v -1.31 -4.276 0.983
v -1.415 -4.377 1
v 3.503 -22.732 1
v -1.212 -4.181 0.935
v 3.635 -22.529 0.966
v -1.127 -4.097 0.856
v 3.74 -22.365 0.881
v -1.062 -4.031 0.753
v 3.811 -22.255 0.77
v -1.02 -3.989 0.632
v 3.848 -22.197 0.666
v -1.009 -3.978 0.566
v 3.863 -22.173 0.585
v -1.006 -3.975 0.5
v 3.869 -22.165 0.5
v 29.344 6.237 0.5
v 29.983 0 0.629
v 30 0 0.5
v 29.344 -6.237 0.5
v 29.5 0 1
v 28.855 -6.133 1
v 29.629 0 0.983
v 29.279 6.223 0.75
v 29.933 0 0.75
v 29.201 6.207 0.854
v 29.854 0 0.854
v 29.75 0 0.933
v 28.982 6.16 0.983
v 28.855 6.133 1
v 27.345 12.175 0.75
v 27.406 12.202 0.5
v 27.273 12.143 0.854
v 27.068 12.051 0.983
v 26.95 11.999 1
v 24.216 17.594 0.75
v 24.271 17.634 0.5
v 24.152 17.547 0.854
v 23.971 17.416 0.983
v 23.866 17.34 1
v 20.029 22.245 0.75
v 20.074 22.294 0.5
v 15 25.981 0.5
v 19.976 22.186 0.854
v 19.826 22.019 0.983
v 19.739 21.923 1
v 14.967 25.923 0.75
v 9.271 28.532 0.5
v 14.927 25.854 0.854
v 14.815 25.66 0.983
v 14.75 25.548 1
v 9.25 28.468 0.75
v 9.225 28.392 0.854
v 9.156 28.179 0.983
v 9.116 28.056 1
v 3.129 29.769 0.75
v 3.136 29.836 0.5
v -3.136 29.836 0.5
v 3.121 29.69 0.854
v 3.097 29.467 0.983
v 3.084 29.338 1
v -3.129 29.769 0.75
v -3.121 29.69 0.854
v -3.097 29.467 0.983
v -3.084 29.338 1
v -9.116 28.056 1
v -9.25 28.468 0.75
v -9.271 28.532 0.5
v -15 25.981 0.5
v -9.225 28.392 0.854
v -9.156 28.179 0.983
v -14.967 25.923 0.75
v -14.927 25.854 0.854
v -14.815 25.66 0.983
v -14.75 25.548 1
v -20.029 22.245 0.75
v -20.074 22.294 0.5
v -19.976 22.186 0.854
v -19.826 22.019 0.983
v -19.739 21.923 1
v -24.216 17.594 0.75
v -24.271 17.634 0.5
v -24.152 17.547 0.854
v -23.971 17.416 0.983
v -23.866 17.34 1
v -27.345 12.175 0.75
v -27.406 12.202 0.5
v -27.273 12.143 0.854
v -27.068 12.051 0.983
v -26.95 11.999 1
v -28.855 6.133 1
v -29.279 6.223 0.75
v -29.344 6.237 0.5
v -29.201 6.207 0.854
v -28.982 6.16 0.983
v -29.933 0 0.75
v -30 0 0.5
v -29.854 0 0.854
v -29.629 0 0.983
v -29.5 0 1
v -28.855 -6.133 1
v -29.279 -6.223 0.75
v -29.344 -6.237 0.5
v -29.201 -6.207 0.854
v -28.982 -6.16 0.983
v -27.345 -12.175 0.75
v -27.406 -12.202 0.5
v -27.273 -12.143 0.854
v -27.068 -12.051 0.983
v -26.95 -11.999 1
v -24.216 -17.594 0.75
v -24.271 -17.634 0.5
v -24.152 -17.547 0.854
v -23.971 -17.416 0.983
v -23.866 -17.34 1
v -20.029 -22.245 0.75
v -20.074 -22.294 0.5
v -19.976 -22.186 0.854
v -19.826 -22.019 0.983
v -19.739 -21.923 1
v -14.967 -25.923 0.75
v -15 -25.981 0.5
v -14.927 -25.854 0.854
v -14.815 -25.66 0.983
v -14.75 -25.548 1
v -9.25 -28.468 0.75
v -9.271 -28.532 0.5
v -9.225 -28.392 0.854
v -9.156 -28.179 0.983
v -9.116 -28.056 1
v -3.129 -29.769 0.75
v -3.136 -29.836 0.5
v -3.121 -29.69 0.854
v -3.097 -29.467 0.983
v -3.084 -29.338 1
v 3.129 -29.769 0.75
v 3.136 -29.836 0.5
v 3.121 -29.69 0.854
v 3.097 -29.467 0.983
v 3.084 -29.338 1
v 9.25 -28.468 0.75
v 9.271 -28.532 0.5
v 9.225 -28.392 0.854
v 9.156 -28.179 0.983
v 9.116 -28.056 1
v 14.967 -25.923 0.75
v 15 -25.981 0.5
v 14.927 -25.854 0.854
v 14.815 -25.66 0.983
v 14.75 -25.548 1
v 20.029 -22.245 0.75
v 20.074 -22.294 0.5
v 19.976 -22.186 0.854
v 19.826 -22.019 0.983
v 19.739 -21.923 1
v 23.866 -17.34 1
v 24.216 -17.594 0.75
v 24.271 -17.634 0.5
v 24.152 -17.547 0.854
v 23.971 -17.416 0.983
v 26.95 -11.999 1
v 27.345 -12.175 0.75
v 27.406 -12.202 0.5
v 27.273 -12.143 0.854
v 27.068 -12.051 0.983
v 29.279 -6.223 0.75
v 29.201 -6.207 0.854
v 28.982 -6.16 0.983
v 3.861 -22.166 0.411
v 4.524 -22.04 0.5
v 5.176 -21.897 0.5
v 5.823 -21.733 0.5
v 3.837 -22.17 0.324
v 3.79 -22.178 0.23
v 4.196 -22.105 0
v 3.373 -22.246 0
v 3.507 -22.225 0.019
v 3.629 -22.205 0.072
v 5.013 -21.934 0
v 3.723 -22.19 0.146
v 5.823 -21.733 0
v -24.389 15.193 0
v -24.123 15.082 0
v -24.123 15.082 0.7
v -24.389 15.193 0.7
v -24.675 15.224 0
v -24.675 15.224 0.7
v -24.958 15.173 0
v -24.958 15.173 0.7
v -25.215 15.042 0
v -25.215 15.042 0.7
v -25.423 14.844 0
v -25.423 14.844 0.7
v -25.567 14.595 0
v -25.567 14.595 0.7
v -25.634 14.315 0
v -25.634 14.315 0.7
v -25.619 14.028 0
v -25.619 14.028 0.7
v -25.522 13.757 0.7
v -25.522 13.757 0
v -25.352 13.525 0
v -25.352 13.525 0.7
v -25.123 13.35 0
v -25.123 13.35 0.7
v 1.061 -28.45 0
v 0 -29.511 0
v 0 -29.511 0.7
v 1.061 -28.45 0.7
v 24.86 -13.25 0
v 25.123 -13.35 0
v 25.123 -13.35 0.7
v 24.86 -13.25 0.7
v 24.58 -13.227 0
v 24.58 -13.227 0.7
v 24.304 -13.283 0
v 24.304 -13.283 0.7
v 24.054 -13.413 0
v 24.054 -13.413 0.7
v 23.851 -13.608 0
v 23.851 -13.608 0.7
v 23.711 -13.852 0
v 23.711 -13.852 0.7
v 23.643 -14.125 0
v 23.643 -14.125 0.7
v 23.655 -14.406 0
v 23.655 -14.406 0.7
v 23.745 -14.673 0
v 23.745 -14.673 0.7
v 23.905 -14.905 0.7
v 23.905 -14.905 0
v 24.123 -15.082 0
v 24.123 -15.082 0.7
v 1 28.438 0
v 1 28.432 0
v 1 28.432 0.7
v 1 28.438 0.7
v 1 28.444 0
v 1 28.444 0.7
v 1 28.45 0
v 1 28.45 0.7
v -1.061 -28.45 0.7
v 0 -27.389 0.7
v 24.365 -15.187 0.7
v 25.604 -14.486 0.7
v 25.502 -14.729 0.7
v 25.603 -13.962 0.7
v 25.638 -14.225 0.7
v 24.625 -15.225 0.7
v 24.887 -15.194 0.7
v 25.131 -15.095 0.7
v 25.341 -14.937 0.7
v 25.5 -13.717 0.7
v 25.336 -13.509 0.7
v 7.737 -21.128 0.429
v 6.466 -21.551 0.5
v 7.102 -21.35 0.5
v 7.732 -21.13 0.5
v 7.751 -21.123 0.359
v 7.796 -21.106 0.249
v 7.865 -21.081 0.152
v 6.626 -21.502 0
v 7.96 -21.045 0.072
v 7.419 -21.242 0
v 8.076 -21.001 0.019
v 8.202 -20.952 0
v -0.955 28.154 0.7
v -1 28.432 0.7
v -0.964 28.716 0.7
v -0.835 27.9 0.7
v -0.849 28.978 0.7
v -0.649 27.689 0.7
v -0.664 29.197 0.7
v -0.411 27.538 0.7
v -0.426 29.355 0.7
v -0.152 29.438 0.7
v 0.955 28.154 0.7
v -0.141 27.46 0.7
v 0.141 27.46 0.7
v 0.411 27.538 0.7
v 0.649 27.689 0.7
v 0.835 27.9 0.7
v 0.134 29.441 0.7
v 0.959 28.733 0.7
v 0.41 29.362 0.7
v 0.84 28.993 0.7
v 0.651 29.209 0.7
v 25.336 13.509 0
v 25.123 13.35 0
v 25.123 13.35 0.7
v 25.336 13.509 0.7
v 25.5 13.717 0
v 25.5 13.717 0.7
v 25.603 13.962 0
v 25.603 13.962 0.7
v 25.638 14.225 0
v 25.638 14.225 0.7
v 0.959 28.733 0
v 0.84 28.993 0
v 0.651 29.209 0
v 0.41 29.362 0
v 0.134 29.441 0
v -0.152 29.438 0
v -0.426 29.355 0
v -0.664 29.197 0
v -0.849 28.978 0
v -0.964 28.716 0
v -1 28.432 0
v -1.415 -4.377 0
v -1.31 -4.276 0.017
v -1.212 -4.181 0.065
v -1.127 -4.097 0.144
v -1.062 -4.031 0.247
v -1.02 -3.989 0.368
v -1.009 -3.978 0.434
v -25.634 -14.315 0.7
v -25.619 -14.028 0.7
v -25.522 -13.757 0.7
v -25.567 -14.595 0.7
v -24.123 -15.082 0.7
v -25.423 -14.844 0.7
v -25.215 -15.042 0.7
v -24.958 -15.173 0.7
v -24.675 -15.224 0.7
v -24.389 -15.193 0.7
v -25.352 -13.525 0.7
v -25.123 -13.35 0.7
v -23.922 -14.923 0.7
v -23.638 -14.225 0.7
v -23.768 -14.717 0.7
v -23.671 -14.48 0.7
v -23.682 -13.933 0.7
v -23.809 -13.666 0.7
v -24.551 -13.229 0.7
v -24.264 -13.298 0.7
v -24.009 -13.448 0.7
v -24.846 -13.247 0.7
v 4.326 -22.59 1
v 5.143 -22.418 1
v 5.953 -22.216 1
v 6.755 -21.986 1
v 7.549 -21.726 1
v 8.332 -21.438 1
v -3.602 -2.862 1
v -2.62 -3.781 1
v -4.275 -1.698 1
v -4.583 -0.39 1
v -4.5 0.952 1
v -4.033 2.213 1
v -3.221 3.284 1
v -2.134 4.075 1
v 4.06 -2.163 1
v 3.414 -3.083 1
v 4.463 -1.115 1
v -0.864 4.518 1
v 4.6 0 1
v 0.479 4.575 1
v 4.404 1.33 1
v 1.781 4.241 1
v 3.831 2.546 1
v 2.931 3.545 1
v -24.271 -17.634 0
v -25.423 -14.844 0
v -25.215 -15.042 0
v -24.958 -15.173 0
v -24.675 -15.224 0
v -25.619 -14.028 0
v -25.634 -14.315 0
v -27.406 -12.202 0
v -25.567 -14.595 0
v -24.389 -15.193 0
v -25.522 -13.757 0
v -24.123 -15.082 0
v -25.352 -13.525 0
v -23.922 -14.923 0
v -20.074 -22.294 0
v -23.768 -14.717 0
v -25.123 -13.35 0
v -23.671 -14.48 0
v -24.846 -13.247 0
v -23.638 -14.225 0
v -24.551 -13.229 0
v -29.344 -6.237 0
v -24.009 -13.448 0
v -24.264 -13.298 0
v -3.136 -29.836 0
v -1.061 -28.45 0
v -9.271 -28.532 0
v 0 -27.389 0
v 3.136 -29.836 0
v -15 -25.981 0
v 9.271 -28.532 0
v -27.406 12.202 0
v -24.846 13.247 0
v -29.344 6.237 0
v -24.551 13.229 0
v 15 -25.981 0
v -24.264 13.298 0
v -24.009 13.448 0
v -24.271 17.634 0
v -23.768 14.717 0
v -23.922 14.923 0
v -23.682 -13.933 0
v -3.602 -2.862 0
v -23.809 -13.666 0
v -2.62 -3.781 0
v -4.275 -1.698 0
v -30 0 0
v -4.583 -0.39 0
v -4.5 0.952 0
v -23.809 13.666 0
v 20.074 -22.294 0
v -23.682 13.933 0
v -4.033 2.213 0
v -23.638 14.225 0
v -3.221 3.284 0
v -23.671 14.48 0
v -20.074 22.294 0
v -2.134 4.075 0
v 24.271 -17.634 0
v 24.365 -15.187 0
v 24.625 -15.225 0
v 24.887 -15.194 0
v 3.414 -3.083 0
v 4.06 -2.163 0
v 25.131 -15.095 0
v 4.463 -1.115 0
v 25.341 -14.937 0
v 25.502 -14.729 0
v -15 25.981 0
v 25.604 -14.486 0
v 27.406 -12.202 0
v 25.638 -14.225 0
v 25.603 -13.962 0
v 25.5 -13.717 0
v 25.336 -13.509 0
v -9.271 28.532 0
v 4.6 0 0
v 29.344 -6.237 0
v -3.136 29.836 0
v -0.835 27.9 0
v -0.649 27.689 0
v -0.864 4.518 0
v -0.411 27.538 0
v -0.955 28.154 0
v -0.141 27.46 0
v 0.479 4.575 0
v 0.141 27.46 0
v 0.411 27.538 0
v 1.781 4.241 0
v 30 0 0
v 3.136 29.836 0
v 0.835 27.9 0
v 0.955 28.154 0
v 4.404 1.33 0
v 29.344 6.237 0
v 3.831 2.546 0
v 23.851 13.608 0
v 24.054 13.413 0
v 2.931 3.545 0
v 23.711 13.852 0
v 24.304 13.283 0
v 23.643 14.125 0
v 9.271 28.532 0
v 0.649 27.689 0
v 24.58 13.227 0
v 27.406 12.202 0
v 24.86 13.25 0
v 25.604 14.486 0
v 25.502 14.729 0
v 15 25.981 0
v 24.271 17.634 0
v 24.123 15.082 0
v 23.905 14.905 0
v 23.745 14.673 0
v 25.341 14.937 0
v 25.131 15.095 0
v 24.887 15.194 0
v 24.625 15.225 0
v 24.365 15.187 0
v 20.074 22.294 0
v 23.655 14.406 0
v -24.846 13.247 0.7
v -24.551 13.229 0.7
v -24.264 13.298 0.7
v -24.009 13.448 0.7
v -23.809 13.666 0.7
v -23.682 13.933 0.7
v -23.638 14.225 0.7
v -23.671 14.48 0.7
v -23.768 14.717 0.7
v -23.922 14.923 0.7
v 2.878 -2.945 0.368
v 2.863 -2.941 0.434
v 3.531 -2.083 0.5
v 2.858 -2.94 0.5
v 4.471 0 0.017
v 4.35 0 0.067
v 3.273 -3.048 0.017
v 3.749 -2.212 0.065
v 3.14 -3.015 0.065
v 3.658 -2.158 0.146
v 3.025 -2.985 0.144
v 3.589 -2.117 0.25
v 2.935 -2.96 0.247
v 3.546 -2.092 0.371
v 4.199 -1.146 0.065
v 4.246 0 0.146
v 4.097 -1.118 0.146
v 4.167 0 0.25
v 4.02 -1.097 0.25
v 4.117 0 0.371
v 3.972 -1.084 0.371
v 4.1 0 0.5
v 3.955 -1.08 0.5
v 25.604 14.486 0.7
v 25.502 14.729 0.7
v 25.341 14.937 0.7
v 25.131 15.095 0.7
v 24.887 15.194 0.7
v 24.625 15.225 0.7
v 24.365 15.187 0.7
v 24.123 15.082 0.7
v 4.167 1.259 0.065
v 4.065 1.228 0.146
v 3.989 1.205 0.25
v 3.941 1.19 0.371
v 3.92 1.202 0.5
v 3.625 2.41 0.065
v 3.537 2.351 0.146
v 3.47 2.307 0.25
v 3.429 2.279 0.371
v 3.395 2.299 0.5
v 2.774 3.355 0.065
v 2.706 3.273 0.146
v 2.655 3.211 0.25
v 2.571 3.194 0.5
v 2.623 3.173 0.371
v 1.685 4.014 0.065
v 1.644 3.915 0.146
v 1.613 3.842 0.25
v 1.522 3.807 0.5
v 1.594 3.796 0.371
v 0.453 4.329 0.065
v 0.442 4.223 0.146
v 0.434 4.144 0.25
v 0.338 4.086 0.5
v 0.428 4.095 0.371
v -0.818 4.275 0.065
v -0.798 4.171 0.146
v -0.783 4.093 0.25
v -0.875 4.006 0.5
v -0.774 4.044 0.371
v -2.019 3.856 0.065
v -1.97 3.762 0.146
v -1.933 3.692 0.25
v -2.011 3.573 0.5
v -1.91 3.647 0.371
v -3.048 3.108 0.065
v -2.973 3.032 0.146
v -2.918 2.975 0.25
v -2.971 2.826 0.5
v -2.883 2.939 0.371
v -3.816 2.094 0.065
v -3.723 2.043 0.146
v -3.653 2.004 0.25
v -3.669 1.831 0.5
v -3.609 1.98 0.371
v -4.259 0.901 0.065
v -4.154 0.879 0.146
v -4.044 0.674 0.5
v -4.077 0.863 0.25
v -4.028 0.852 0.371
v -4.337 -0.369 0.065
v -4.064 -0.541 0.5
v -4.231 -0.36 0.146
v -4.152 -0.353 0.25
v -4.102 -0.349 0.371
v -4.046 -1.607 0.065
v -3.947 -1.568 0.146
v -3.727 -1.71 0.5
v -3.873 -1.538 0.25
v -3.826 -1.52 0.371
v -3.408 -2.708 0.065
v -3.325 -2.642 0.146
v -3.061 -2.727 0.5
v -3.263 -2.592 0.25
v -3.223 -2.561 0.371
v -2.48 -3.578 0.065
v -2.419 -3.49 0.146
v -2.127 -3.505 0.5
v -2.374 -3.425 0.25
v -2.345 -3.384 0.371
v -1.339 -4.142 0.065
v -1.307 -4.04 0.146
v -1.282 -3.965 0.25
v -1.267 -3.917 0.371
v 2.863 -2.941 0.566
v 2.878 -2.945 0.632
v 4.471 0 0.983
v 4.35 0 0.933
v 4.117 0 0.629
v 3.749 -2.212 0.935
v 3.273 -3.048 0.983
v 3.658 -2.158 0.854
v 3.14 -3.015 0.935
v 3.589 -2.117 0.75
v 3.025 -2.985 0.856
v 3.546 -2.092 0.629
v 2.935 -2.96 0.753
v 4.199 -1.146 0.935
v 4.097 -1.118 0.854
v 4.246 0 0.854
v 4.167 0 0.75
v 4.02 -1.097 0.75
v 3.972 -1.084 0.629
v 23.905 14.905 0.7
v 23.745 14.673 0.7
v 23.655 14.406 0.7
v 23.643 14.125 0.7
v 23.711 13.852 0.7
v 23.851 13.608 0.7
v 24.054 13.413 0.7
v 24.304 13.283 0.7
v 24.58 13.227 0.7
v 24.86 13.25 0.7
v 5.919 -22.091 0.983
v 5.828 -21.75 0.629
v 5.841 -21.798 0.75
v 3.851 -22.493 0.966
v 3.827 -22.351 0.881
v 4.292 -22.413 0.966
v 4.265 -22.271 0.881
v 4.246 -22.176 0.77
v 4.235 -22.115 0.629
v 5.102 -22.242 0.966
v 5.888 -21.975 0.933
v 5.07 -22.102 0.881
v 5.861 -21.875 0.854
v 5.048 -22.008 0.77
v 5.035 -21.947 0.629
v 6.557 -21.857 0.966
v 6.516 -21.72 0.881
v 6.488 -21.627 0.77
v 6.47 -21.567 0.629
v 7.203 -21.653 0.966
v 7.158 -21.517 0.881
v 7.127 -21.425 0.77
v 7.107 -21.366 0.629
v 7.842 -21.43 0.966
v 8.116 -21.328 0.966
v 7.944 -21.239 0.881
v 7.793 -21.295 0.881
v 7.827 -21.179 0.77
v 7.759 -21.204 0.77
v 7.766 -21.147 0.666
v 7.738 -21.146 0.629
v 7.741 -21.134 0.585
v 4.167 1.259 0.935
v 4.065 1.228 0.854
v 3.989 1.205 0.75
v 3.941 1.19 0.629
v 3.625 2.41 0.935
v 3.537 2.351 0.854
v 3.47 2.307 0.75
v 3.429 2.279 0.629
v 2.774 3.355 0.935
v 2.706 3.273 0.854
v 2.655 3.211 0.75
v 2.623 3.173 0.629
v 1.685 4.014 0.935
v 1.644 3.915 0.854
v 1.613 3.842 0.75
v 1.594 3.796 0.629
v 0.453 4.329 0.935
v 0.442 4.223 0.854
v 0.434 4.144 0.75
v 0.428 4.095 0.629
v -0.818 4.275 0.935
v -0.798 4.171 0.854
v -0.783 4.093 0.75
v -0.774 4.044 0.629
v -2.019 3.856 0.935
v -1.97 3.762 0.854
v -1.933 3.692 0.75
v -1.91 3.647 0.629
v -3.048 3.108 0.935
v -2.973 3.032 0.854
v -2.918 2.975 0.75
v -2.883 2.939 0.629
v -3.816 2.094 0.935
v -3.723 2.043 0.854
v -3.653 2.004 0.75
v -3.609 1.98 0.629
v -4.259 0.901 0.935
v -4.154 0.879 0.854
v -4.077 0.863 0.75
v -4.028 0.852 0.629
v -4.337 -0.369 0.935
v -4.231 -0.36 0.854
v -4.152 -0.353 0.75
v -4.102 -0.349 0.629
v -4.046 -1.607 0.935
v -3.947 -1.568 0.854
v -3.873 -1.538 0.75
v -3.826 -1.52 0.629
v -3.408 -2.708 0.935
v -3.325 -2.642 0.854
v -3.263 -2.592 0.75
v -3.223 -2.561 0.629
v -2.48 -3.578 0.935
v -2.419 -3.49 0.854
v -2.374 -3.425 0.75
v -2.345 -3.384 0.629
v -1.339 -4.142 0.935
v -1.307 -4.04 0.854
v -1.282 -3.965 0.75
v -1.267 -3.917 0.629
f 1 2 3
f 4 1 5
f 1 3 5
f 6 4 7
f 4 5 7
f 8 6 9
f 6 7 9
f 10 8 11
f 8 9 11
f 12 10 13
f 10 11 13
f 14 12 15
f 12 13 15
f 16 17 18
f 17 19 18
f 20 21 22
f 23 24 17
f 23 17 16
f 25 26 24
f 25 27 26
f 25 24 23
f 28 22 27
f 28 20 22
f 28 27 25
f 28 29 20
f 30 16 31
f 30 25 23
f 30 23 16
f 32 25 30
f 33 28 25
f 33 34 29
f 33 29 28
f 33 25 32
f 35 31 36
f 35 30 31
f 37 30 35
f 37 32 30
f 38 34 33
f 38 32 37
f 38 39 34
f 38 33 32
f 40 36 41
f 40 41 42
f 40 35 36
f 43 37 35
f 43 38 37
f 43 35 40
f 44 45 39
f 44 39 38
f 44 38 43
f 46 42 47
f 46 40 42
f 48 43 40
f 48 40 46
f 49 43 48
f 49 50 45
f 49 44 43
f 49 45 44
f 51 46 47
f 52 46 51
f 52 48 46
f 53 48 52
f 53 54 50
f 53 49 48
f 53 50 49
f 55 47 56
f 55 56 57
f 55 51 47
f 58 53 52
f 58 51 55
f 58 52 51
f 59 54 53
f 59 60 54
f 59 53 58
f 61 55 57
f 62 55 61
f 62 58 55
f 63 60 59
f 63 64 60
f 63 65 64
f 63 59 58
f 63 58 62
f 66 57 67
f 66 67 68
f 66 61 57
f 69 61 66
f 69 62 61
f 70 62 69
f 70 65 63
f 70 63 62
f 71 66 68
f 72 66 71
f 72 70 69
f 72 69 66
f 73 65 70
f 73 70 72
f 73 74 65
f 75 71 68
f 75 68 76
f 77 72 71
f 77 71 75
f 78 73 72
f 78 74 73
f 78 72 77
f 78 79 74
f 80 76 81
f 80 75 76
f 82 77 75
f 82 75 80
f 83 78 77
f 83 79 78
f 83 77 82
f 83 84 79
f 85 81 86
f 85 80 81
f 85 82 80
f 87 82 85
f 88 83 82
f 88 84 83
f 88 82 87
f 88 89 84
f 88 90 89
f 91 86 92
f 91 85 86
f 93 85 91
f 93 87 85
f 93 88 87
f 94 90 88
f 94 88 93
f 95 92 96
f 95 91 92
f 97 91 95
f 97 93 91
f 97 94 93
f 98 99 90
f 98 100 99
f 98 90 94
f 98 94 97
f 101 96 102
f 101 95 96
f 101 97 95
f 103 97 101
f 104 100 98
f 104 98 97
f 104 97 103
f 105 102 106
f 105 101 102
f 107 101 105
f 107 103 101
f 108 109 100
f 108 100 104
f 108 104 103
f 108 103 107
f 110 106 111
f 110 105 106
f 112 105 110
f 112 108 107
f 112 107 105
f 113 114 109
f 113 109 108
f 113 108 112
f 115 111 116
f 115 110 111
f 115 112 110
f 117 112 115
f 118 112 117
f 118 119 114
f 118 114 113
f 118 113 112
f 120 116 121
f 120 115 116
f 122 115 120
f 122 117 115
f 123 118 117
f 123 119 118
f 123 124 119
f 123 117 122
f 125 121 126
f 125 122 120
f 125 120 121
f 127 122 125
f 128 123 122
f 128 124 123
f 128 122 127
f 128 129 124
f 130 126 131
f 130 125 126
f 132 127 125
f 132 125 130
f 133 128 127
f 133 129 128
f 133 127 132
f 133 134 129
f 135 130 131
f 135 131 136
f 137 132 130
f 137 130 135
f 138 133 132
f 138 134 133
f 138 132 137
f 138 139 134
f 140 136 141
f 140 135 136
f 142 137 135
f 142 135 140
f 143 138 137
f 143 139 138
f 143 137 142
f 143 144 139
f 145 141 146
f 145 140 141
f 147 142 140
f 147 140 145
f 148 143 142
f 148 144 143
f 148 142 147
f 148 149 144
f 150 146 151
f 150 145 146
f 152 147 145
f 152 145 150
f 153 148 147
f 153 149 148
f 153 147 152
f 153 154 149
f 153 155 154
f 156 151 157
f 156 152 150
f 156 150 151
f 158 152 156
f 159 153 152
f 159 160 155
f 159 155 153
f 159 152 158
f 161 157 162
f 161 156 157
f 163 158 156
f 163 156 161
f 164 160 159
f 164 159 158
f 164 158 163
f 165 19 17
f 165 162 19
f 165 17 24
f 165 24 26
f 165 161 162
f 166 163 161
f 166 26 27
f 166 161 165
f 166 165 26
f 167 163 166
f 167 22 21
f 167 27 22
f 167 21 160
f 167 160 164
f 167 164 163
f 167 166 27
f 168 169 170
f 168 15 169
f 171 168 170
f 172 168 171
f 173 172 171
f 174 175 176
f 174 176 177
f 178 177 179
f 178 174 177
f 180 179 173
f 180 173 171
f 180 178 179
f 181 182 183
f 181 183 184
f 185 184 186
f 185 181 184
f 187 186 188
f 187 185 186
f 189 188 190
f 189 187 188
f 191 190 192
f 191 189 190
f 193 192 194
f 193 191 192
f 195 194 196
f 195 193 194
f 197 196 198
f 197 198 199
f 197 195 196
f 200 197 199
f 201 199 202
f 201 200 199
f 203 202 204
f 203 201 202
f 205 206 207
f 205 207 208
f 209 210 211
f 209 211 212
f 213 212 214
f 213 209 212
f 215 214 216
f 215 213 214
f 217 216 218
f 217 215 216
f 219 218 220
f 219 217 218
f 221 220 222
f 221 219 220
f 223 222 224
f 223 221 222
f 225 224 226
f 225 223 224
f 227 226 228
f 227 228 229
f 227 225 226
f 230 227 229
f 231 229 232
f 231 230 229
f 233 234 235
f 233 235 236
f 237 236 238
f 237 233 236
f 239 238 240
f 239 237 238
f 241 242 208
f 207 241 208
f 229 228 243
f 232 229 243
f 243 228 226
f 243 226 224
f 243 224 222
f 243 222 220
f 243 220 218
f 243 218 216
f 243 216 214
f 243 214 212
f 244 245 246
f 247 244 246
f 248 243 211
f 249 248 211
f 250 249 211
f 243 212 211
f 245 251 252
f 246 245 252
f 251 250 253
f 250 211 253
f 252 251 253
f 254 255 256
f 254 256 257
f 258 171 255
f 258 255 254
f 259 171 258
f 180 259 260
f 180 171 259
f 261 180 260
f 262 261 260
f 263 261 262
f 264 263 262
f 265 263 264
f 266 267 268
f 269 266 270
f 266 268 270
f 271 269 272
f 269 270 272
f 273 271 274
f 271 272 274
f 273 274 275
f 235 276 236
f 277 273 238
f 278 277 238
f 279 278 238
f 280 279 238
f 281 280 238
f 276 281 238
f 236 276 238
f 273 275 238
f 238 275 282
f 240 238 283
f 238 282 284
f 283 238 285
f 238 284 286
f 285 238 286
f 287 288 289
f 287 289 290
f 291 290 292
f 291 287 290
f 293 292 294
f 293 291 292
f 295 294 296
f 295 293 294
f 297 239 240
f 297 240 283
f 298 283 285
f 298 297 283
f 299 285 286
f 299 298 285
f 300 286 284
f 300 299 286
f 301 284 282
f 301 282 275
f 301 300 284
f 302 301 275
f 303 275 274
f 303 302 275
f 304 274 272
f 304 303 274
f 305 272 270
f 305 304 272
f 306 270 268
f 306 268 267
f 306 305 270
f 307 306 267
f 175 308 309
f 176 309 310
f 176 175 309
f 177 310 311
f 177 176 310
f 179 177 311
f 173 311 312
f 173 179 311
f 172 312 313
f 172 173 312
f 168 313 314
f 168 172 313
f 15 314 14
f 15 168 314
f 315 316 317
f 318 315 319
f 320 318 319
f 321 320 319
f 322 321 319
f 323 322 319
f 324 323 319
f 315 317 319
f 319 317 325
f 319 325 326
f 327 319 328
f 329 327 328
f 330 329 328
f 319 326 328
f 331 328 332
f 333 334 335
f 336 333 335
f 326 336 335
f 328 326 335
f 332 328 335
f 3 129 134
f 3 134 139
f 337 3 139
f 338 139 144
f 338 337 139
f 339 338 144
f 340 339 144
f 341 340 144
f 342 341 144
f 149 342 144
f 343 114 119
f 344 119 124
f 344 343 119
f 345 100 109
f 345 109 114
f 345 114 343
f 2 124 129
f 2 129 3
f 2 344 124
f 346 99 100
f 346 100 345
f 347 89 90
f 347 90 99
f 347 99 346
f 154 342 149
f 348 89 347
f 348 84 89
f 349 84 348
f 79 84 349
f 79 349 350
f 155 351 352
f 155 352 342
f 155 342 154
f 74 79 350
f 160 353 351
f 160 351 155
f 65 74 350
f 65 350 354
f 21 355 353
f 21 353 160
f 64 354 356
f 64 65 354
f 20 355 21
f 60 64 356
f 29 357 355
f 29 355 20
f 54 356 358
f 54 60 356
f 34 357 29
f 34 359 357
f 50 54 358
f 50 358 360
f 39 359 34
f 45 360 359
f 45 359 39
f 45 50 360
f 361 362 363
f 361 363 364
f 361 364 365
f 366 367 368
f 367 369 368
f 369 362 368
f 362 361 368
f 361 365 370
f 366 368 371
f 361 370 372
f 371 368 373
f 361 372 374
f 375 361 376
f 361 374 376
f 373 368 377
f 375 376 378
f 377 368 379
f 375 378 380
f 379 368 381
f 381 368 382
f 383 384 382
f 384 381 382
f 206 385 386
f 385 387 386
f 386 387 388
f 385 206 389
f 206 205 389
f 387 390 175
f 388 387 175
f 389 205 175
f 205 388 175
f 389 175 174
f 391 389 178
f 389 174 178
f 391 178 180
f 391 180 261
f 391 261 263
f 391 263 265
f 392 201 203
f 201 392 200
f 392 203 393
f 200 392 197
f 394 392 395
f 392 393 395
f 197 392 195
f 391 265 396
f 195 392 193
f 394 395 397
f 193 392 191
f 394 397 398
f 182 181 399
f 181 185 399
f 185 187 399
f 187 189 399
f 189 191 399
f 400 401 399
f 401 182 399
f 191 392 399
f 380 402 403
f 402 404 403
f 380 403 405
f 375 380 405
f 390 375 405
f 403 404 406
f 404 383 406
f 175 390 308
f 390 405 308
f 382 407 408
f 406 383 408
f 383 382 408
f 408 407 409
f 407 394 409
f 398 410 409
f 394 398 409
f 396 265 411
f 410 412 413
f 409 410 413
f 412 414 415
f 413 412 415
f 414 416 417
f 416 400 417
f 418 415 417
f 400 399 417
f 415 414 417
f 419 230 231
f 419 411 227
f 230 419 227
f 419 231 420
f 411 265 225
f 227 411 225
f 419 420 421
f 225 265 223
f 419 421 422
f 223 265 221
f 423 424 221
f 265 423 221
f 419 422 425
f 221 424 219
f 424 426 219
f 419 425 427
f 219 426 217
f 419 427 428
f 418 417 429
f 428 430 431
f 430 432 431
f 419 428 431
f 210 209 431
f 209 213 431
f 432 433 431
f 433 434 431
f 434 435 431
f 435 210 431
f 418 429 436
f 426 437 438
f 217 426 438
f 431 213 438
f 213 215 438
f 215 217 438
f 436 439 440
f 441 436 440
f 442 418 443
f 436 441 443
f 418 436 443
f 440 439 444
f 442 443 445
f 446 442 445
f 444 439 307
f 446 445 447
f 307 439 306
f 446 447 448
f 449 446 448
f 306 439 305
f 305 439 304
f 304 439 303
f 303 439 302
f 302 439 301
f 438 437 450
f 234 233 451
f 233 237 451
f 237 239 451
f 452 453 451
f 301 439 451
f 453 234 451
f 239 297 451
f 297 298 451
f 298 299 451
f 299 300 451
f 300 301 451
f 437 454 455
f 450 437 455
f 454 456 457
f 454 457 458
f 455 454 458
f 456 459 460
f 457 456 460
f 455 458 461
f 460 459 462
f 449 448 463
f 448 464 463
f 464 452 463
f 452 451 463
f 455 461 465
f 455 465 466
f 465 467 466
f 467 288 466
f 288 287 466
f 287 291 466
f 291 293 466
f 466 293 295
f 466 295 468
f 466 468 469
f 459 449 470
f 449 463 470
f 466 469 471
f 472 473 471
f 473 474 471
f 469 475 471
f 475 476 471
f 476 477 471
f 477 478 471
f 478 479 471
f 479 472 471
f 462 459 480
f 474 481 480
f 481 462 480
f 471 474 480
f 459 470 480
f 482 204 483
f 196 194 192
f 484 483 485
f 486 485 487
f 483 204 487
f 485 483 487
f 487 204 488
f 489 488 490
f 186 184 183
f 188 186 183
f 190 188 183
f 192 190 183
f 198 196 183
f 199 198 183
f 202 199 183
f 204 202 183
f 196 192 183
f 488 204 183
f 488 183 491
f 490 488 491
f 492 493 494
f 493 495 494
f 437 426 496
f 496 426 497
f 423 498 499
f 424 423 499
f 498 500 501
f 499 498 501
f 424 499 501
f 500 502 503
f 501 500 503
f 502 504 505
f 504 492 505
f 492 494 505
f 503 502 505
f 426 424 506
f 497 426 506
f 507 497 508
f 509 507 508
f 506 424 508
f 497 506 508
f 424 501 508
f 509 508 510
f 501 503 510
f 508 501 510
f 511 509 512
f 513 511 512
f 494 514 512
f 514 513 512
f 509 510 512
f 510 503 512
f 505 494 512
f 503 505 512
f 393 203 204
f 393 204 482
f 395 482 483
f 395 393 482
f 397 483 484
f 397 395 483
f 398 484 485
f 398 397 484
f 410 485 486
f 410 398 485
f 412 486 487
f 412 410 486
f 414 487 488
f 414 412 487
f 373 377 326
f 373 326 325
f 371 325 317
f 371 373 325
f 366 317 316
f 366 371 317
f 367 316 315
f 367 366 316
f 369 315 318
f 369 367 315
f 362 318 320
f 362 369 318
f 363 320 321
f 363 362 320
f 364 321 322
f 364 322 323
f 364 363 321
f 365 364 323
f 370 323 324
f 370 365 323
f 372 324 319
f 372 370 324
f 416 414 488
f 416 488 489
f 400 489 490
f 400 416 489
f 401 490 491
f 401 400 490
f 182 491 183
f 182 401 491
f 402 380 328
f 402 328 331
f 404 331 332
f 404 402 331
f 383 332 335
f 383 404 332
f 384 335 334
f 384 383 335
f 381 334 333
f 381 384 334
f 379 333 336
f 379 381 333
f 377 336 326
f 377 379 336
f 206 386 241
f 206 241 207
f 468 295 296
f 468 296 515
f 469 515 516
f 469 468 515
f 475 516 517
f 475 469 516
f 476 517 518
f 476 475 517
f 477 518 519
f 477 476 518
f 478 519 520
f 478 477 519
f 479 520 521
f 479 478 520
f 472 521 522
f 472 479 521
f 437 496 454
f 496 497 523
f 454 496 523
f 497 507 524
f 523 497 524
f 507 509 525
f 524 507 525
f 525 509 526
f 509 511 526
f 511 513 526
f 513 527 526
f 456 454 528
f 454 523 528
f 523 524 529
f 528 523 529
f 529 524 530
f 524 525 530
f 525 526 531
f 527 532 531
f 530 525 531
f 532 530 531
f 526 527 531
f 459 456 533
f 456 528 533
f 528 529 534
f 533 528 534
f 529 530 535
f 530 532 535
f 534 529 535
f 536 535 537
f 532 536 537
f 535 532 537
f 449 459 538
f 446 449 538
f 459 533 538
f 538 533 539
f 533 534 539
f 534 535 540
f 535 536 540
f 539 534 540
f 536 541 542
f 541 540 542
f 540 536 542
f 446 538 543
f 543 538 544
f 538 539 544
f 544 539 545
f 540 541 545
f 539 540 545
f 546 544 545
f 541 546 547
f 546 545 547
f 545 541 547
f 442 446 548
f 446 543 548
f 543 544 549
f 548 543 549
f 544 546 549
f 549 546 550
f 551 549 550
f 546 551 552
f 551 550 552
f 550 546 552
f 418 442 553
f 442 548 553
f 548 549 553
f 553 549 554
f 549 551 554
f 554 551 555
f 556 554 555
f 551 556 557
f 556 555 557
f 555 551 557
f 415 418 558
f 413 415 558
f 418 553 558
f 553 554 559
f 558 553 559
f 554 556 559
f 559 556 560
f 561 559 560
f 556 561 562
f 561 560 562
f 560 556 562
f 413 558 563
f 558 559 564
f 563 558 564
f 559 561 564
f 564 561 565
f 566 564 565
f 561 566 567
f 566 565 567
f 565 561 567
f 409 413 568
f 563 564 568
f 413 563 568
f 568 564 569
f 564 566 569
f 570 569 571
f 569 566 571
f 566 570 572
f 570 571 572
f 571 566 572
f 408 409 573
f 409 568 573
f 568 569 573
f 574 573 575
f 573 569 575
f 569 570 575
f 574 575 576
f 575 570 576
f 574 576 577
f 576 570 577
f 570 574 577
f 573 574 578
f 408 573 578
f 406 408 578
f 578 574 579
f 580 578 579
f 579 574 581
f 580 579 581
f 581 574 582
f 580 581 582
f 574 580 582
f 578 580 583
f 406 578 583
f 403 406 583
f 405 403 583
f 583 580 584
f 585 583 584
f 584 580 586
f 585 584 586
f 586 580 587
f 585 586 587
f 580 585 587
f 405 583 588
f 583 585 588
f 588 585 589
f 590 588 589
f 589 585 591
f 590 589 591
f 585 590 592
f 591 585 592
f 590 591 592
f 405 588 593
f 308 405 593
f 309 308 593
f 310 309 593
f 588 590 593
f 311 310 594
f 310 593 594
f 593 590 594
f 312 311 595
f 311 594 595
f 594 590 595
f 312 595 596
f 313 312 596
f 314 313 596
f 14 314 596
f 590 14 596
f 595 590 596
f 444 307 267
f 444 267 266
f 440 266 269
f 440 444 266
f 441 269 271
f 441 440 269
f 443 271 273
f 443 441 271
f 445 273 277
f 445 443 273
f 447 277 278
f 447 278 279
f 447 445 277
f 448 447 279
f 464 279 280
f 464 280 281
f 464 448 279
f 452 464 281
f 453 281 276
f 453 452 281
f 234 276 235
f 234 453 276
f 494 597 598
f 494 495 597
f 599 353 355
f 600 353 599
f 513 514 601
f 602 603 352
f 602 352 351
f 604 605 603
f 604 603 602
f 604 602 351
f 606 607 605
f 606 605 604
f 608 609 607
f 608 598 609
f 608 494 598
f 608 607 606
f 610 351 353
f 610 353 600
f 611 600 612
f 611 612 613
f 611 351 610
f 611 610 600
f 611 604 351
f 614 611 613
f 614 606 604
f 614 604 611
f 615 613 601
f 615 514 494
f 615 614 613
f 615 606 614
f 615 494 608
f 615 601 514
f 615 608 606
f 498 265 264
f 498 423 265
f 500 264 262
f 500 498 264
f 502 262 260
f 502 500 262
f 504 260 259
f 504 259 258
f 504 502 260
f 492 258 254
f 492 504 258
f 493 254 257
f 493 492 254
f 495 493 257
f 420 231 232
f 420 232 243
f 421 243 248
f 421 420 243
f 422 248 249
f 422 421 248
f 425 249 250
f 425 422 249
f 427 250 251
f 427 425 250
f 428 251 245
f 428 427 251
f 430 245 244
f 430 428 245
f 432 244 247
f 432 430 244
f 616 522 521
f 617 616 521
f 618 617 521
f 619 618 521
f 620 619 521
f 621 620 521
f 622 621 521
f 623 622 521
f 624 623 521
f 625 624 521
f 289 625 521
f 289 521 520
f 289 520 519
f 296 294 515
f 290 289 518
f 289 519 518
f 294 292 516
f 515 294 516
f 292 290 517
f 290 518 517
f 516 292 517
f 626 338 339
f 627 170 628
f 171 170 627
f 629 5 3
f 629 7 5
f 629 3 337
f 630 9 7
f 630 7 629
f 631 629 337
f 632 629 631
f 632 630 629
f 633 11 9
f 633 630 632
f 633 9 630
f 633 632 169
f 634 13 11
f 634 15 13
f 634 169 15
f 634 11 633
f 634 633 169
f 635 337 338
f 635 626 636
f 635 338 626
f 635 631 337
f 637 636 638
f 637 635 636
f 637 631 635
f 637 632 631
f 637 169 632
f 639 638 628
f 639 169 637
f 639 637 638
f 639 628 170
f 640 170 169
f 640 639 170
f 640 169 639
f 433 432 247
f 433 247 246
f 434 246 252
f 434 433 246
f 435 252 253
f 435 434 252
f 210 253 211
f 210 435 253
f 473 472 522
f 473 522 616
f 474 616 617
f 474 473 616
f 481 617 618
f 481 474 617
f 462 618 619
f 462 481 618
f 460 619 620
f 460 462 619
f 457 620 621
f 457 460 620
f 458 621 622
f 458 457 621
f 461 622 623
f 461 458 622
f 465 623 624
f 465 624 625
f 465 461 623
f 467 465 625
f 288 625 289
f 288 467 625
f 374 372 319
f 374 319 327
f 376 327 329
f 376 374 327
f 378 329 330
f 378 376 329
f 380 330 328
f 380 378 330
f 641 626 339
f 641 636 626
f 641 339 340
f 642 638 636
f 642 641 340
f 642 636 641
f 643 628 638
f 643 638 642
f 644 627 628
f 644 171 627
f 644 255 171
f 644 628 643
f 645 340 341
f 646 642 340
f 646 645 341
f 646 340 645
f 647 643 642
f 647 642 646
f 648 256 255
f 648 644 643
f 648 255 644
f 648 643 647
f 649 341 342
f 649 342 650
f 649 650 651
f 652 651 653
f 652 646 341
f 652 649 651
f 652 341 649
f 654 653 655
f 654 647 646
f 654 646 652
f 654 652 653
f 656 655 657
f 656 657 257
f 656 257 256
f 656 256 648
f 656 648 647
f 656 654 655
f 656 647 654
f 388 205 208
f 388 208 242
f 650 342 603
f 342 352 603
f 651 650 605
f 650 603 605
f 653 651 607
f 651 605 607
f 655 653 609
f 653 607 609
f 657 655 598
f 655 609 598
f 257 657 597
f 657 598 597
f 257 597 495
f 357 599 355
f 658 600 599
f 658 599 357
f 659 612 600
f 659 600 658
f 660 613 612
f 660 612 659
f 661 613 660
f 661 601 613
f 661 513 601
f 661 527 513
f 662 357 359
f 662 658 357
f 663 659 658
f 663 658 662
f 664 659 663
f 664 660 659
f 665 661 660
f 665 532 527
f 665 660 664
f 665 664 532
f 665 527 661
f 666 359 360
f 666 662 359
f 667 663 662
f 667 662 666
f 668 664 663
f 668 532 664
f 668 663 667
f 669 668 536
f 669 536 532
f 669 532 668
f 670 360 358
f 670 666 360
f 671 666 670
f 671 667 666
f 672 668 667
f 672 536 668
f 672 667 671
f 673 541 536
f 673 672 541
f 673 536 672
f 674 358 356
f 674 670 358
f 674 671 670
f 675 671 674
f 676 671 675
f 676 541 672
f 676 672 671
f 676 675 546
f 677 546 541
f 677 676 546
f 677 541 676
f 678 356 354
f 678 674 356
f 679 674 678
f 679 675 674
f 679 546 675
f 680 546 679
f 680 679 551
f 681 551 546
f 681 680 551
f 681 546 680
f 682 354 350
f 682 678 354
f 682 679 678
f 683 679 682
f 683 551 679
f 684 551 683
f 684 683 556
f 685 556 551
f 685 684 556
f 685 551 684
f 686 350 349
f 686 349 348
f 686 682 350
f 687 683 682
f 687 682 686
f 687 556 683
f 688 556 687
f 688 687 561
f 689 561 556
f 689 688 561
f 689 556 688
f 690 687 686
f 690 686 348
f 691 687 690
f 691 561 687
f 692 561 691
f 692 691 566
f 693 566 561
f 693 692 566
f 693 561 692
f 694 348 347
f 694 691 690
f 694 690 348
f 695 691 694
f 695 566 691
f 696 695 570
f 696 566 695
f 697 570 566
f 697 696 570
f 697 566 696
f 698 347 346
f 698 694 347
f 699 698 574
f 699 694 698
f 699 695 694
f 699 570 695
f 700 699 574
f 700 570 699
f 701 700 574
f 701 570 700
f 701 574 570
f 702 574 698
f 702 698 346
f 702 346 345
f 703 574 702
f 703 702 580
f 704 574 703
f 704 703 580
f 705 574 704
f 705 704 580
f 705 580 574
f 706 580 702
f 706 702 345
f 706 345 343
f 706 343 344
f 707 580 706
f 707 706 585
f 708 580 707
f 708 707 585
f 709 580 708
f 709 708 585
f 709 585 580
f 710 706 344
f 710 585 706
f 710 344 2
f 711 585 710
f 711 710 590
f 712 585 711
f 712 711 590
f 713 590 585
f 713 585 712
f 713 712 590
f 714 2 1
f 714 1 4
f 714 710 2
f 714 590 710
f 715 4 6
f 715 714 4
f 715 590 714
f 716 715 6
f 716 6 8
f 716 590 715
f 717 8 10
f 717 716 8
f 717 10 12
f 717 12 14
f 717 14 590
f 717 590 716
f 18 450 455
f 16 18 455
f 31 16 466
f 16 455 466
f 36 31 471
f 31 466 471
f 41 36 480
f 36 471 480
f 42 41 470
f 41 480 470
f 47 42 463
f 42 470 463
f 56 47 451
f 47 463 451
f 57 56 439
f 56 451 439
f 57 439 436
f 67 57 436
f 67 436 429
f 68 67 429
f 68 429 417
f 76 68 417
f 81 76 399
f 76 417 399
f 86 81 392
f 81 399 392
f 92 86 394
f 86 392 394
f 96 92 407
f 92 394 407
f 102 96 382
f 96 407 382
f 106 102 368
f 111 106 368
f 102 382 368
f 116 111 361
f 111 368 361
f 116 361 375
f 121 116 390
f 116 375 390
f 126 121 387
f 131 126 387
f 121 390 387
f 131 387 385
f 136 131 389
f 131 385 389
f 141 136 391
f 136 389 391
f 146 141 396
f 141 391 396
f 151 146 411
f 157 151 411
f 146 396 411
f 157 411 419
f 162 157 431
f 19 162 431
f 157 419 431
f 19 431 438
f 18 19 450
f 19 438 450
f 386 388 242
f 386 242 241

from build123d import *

# Parameters (mm, degrees)
F1_R     = 30
F1_R_2   = 29
F2_DEPTH = 1
F3_DEPTH = 1
F5_DEPTH = 1
F6_DEPTH = 0.7
F8_DEPTH = 1
F9_R     = 0.49999


# Not quite as in the source:
# - a fillet or chamfer is up to 0.001 mm smaller than in the source, because OpenCascade refuses the exact size
# - a feature names something its author has since deleted; it is built from what else it names


with BuildPart() as f2:
    # F1 (on Top) → F2 (new body)
    with BuildSketch(Plane.XY):
        Circle(F1_R)
        Circle(F1_R_2, mode=Mode.SUBTRACT)
    extrude(amount=F2_DEPTH)

    # F1 (on Top) → F3 (join)
    with BuildSketch(Plane.XY):
        Circle(F1_R)
        Circle(F1_R_2, mode=Mode.SUBTRACT)
        Circle(F1_R_2)
    extrude(amount=F3_DEPTH)

    # F4 (on Top) → F5 (join)
    with BuildSketch(Plane.XY):
        with BuildLine():
            ThreePointArc((-23.1384227377, 14.225), (-23.3296108799, 14.9578106993), (-23.8544380991, 15.5038151104))
            ThreePointArc((-23.8544380991, 15.5038151104), (-23.9897856273, 15.2935504561), (-24.123279831, 15.0821043027))
            ThreePointArc((-24.123279831, 15.0821043027), (-23.7680369305, 14.7173703349), (-23.6384227377, 14.225))
            ThreePointArc((-23.6384227377, 14.225), (-24.130831685, 13.3634018783), (-25.1231253841, 13.3503210049))
            ThreePointArc((-25.1231253841, 13.3503210049), (-25.2394960227, 13.1289885565), (-25.3539167907, 12.9066418316))
            ThreePointArc((-25.3539167907, 12.9066418316), (-23.8713637698, 12.9359613893), (-23.1384227377, 14.225))
        make_face()
        with BuildLine():
            ThreePointArc((-24.123279831, 15.0821043027), (-23.9897856273, 15.2935504561), (-23.8544380991, 15.5038151104))
            ThreePointArc((-23.8544380991, 15.5038151104), (-25.9374608433, 14.975), (-25.3539167907, 12.9066418316))
            ThreePointArc((-25.3539167907, 12.9066418316), (-25.2394960227, 13.1289885565), (-25.1231253841, 13.3503210049))
            ThreePointArc((-25.1231253841, 13.3503210049), (-25.5044481415, 14.725), (-24.123279831, 15.0821043027))
        make_face()
        with BuildLine():
            ThreePointArc((-1.4994786916, 28.410456942), (0, 26.95), (1.4994786916, 28.410456942))
            ThreePointArc((1.4994786916, 28.410456942), (1.2497103954, 28.4225390127), (0.9998455532, 28.4324253076))
            ThreePointArc((0.9998455532, 28.4324253076), (0, 27.45), (-0.9998455532, 28.4324253076))
            ThreePointArc((-0.9998455532, 28.4324253076), (-1.2497103954, 28.4225390127), (-1.4994786916, 28.410456942))
        make_face()
        with BuildLine():
            ThreePointArc((0.9998455532, 28.4324253076), (1.2497103954, 28.4225390127), (1.4994786916, 28.410456942))
            ThreePointArc((1.4994786916, 28.410456942), (1.4998696672, 28.4302267529), (1.5, 28.45))
            ThreePointArc((1.5, 28.45), (-0.0197732471, 29.9498696672), (-1.4994786916, 28.410456942))
            ThreePointArc((-1.4994786916, 28.410456942), (-1.2497103954, 28.4225390127), (-0.9998455532, 28.4324253076))
            ThreePointArc((-0.9998455532, 28.4324253076), (-0.0087876855, 29.4499613875), (1, 28.45))
            ThreePointArc((1, 28.45), (0.9999613875, 28.4412123145), (0.9998455532, 28.4324253076))
        make_face()
        with BuildLine():
            ThreePointArc((25.1231253841, 13.3503210049), (25.2394960227, 13.1289885565), (25.3539167907, 12.9066418316))
            ThreePointArc((25.3539167907, 12.9066418316), (25.9274613483, 13.4579410321), (26.1384227377, 14.225))
            ThreePointArc((26.1384227377, 14.225), (25.371233437, 15.5338118577), (23.8544380991, 15.5038151104))
            ThreePointArc((23.8544380991, 15.5038151104), (23.9897856273, 15.2935504561), (24.123279831, 15.0821043027))
            ThreePointArc((24.123279831, 15.0821043027), (25.1307930725, 15.0953858072), (25.6384227377, 14.225))
            ThreePointArc((25.6384227377, 14.225), (25.5000208593, 13.7174089473), (25.1231253841, 13.3503210049))
        make_face()
        with BuildLine():
            ThreePointArc((23.8544380991, 15.5038151104), (23.339384632, 13.475), (25.3539167907, 12.9066418316))
            ThreePointArc((25.3539167907, 12.9066418316), (25.2394960227, 13.1289885565), (25.1231253841, 13.3503210049))
            ThreePointArc((25.1231253841, 13.3503210049), (23.7723973339, 13.725), (24.123279831, 15.0821043027))
            ThreePointArc((24.123279831, 15.0821043027), (23.9897856273, 15.2935504561), (23.8544380991, 15.5038151104))
        make_face()
        with BuildLine():
            ThreePointArc((-24.123279831, -15.0821043027), (-23.9897856273, -15.2935504561), (-23.8544380991, -15.5038151104))
            ThreePointArc((-23.8544380991, -15.5038151104), (-23.3296108799, -14.9578106993), (-23.1384227377, -14.225))
            ThreePointArc((-23.1384227377, -14.225), (-23.8713637698, -12.9359613893), (-25.3539167907, -12.9066418316))
            ThreePointArc((-25.3539167907, -12.9066418316), (-25.2394960227, -13.1289885565), (-25.1231253841, -13.3503210049))
            ThreePointArc((-25.1231253841, -13.3503210049), (-24.130831685, -13.3634018783), (-23.6384227377, -14.225))
            ThreePointArc((-23.6384227377, -14.225), (-23.7680369305, -14.7173703349), (-24.123279831, -15.0821043027))
        make_face()
        with BuildLine():
            ThreePointArc((-25.3539167907, -12.9066418316), (-25.9374608433, -14.975), (-23.8544380991, -15.5038151104))
            ThreePointArc((-23.8544380991, -15.5038151104), (-23.9897856273, -15.2935504561), (-24.123279831, -15.0821043027))
            ThreePointArc((-24.123279831, -15.0821043027), (-25.5044481415, -14.725), (-25.1231253841, -13.3503210049))
            ThreePointArc((-25.1231253841, -13.3503210049), (-25.2394960227, -13.1289885565), (-25.3539167907, -12.9066418316))
        make_face()
        with BuildLine():
            ThreePointArc((1.0415869357, -28.4309267639), (1.2705740372, -28.4216139868), (1.4994786916, -28.410456942))
            ThreePointArc((1.4994786916, -28.410456942), (0, -26.95), (-1.4994786916, -28.410456942))
            ThreePointArc((-1.4994786916, -28.410456942), (-1.2705740372, -28.4216139868), (-1.0415869357, -28.4309267639))
            Line((-1.0415869357, -28.4309267639), (0, -27.3893398282))
            Line((0, -27.3893398282), (1.0415869357, -28.4309267639))
        make_face()
        with BuildLine():
            ThreePointArc((1.5, -28.45), (1.4998696672, -28.4302267529), (1.4994786916, -28.410456942))
            ThreePointArc((1.4994786916, -28.410456942), (1.2705740372, -28.4216139868), (1.0415869357, -28.4309267639))
            Line((1.0415869357, -28.4309267639), (1.0606601718, -28.45))
            Line((1.0606601718, -28.45), (0, -29.5106601718))
            Line((0, -29.5106601718), (-1.0606601718, -28.45))
            Line((-1.0606601718, -28.45), (-1.0415869357, -28.4309267639))
            ThreePointArc((-1.0415869357, -28.4309267639), (-1.2705740372, -28.4216139868), (-1.4994786916, -28.410456942))
            ThreePointArc((-1.4994786916, -28.410456942), (-0.0197732471, -29.9498696672), (1.5, -28.45))
        make_face()
        with BuildLine():
            ThreePointArc((26.1384227377, -14.225), (25.9274613483, -13.4579410321), (25.3539167907, -12.9066418316))
            ThreePointArc((25.3539167907, -12.9066418316), (25.2394960227, -13.1289885565), (25.1231253841, -13.3503210049))
            ThreePointArc((25.1231253841, -13.3503210049), (25.5000208593, -13.7174089473), (25.6384227377, -14.225))
            ThreePointArc((25.6384227377, -14.225), (25.1307930725, -15.0953858072), (24.123279831, -15.0821043027))
            ThreePointArc((24.123279831, -15.0821043027), (23.9897856273, -15.2935504561), (23.8544380991, -15.5038151104))
            ThreePointArc((23.8544380991, -15.5038151104), (25.371233437, -15.5338118577), (26.1384227377, -14.225))
        make_face()
        with BuildLine():
            ThreePointArc((25.1231253841, -13.3503210049), (25.2394960227, -13.1289885565), (25.3539167907, -12.9066418316))
            ThreePointArc((25.3539167907, -12.9066418316), (23.339384632, -13.475), (23.8544380991, -15.5038151104))
            ThreePointArc((23.8544380991, -15.5038151104), (23.9897856273, -15.2935504561), (24.123279831, -15.0821043027))
            ThreePointArc((24.123279831, -15.0821043027), (23.7723973339, -13.725), (25.1231253841, -13.3503210049))
        make_face()
        with BuildLine():
            ThreePointArc((-23.6384227377, 14.225), (-23.7680369305, 14.7173703349), (-24.123279831, 15.0821043027))
            ThreePointArc((-24.123279831, 15.0821043027), (-24.6384227377, 14.225), (-25.1231253841, 13.3503210049))
            ThreePointArc((-25.1231253841, 13.3503210049), (-24.130831685, 13.3634018783), (-23.6384227377, 14.225))
        make_face()
        with BuildLine():
            ThreePointArc((-25.1231253841, 13.3503210049), (-24.6384227377, 14.225), (-24.123279831, 15.0821043027))
            ThreePointArc((-24.123279831, 15.0821043027), (-25.5044481415, 14.725), (-25.1231253841, 13.3503210049))
        make_face()
        with BuildLine():
            ThreePointArc((-0.9998455532, 28.4324253076), (0, 28.45), (0.9998455532, 28.4324253076))
            ThreePointArc((0.9998455532, 28.4324253076), (0.9999613875, 28.4412123145), (1, 28.45))
            ThreePointArc((1, 28.45), (-0.0087876855, 29.4499613875), (-0.9998455532, 28.4324253076))
        make_face()
        with BuildLine():
            ThreePointArc((-0.9998455532, 28.4324253076), (0, 27.45), (0.9998455532, 28.4324253076))
            ThreePointArc((0.9998455532, 28.4324253076), (0, 28.45), (-0.9998455532, 28.4324253076))
        make_face()
        with BuildLine():
            ThreePointArc((24.123279831, 15.0821043027), (24.6384227377, 14.225), (25.1231253841, 13.3503210049))
            ThreePointArc((25.1231253841, 13.3503210049), (25.5000208593, 13.7174089473), (25.6384227377, 14.225))
            ThreePointArc((25.6384227377, 14.225), (25.1307930725, 15.0953858072), (24.123279831, 15.0821043027))
        make_face()
        with BuildLine():
            ThreePointArc((24.123279831, 15.0821043027), (23.7723973339, 13.725), (25.1231253841, 13.3503210049))
            ThreePointArc((25.1231253841, 13.3503210049), (24.6384227377, 14.225), (24.123279831, 15.0821043027))
        make_face()
        with BuildLine():
            ThreePointArc((25.6384227377, -14.225), (25.5000208593, -13.7174089473), (25.1231253841, -13.3503210049))
            ThreePointArc((25.1231253841, -13.3503210049), (24.6384227377, -14.225), (24.123279831, -15.0821043027))
            ThreePointArc((24.123279831, -15.0821043027), (25.1307930725, -15.0953858072), (25.6384227377, -14.225))
        make_face()
        with BuildLine():
            ThreePointArc((24.123279831, -15.0821043027), (24.6384227377, -14.225), (25.1231253841, -13.3503210049))
            ThreePointArc((25.1231253841, -13.3503210049), (23.7723973339, -13.725), (24.123279831, -15.0821043027))
        make_face()
        with BuildLine():
            Line((1.0606601718, -28.45), (1.0415869357, -28.4309267639))
            ThreePointArc((1.0415869357, -28.4309267639), (0, -28.45), (-1.0415869357, -28.4309267639))
            Line((-1.0415869357, -28.4309267639), (-1.0606601718, -28.45))
            Line((-1.0606601718, -28.45), (0, -29.5106601718))
            Line((0, -29.5106601718), (1.0606601718, -28.45))
        make_face()
        with BuildLine():
            ThreePointArc((-25.1231253841, -13.3503210049), (-25.5044481415, -14.725), (-24.123279831, -15.0821043027))
            ThreePointArc((-24.123279831, -15.0821043027), (-24.6384227377, -14.225), (-25.1231253841, -13.3503210049))
        make_face()
        with BuildLine():
            ThreePointArc((-25.1231253841, -13.3503210049), (-24.6384227377, -14.225), (-24.123279831, -15.0821043027))
            ThreePointArc((-24.123279831, -15.0821043027), (-23.7680369305, -14.7173703349), (-23.6384227377, -14.225))
            ThreePointArc((-23.6384227377, -14.225), (-24.130831685, -13.3634018783), (-25.1231253841, -13.3503210049))
        make_face()
        with BuildLine():
            ThreePointArc((-1.0415869357, -28.4309267639), (0, -28.45), (1.0415869357, -28.4309267639))
            Line((1.0415869357, -28.4309267639), (0, -27.3893398282))
            Line((0, -27.3893398282), (-1.0415869357, -28.4309267639))
        make_face()
    extrude(amount=F5_DEPTH)

    # F4 (on Top) → F6 (cut)
    with BuildSketch(Plane.XY):
        with BuildLine():
            ThreePointArc((-25.1231253841, 13.3503210049), (-24.6384227377, 14.225), (-24.123279831, 15.0821043027))
            ThreePointArc((-24.123279831, 15.0821043027), (-25.5044481415, 14.725), (-25.1231253841, 13.3503210049))
        make_face()
        with BuildLine():
            ThreePointArc((-23.6384227377, 14.225), (-23.7680369305, 14.7173703349), (-24.123279831, 15.0821043027))
            ThreePointArc((-24.123279831, 15.0821043027), (-24.6384227377, 14.225), (-25.1231253841, 13.3503210049))
            ThreePointArc((-25.1231253841, 13.3503210049), (-24.130831685, 13.3634018783), (-23.6384227377, 14.225))
        make_face()
        with BuildLine():
            ThreePointArc((-0.9998455532, 28.4324253076), (0, 28.45), (0.9998455532, 28.4324253076))
            ThreePointArc((0.9998455532, 28.4324253076), (0.9999613875, 28.4412123145), (1, 28.45))
            ThreePointArc((1, 28.45), (-0.0087876855, 29.4499613875), (-0.9998455532, 28.4324253076))
        make_face()
        with BuildLine():
            ThreePointArc((-0.9998455532, 28.4324253076), (0, 27.45), (0.9998455532, 28.4324253076))
            ThreePointArc((0.9998455532, 28.4324253076), (0, 28.45), (-0.9998455532, 28.4324253076))
        make_face()
        with BuildLine():
            ThreePointArc((24.123279831, 15.0821043027), (23.7723973339, 13.725), (25.1231253841, 13.3503210049))
            ThreePointArc((25.1231253841, 13.3503210049), (24.6384227377, 14.225), (24.123279831, 15.0821043027))
        make_face()
        with BuildLine():
            ThreePointArc((24.123279831, 15.0821043027), (24.6384227377, 14.225), (25.1231253841, 13.3503210049))
            ThreePointArc((25.1231253841, 13.3503210049), (25.5000208593, 13.7174089473), (25.6384227377, 14.225))
            ThreePointArc((25.6384227377, 14.225), (25.1307930725, 15.0953858072), (24.123279831, 15.0821043027))
        make_face()
        with BuildLine():
            ThreePointArc((24.123279831, -15.0821043027), (24.6384227377, -14.225), (25.1231253841, -13.3503210049))
            ThreePointArc((25.1231253841, -13.3503210049), (23.7723973339, -13.725), (24.123279831, -15.0821043027))
        make_face()
        with BuildLine():
            ThreePointArc((25.6384227377, -14.225), (25.5000208593, -13.7174089473), (25.1231253841, -13.3503210049))
            ThreePointArc((25.1231253841, -13.3503210049), (24.6384227377, -14.225), (24.123279831, -15.0821043027))
            ThreePointArc((24.123279831, -15.0821043027), (25.1307930725, -15.0953858072), (25.6384227377, -14.225))
        make_face()
        with BuildLine():
            Line((1.0606601718, -28.45), (1.0415869357, -28.4309267639))
            ThreePointArc((1.0415869357, -28.4309267639), (0, -28.45), (-1.0415869357, -28.4309267639))
            Line((-1.0415869357, -28.4309267639), (-1.0606601718, -28.45))
            Line((-1.0606601718, -28.45), (0, -29.5106601718))
            Line((0, -29.5106601718), (1.0606601718, -28.45))
        make_face()
        with BuildLine():
            ThreePointArc((-1.0415869357, -28.4309267639), (0, -28.45), (1.0415869357, -28.4309267639))
            Line((1.0415869357, -28.4309267639), (0, -27.3893398282))
            Line((0, -27.3893398282), (-1.0415869357, -28.4309267639))
        make_face()
        with BuildLine():
            ThreePointArc((-25.1231253841, -13.3503210049), (-25.5044481415, -14.725), (-24.123279831, -15.0821043027))
            ThreePointArc((-24.123279831, -15.0821043027), (-24.6384227377, -14.225), (-25.1231253841, -13.3503210049))
        make_face()
        with BuildLine():
            ThreePointArc((-25.1231253841, -13.3503210049), (-24.6384227377, -14.225), (-24.123279831, -15.0821043027))
            ThreePointArc((-24.123279831, -15.0821043027), (-23.7680369305, -14.7173703349), (-23.6384227377, -14.225))
            ThreePointArc((-23.6384227377, -14.225), (-24.130831685, -13.3634018783), (-25.1231253841, -13.3503210049))
        make_face()
    extrude(amount=F6_DEPTH, mode=Mode.SUBTRACT)

    # F7 (on Top) → F8 (cut)
    with BuildSketch(Plane.XY):
        with BuildLine():
            ThreePointArc((2.8581924585, -2.9395128627), (3.7768101011, -1.595526703), (4.1, 0))
            ThreePointArc((4.1, 0), (-2.5186708329, 3.23516572), (-1.0055108466, -3.9747890431))
            ThreePointArc((-1.0055108466, -3.9747890431), (0.0287518116, -4.0998991858), (1.0611580849, -3.9602958878))
            ThreePointArc((1.0611580849, -3.9602958878), (2.0250497936, -3.5649927536), (2.8581924585, -2.9395128627))
        make_face()
        with BuildLine():
            ThreePointArc((1.0611580849, -3.9602958878), (0.0287518116, -4.0998991858), (-1.0055108466, -3.9747890431))
            Line((-1.0055108466, -3.9747890431), (3.8685251002, -22.1649388348))
            ThreePointArc((3.8685251002, -22.1649388348), (4.8507795796, -21.9708884088), (5.8234285148, -21.7333310915))
            Line((5.8234285148, -21.7333310915), (1.0611580849, -3.9602958878))
        make_face()
        with BuildLine():
            Line((7.7322284054, -21.1296626544), (2.8581924585, -2.9395128627))
            ThreePointArc((2.8581924585, -2.9395128627), (2.0250497936, -3.5649927536), (1.0611580849, -3.9602958878))
            Line((1.0611580849, -3.9602958878), (5.8234285148, -21.7333310915))
            ThreePointArc((5.8234285148, -21.7333310915), (6.7845458603, -21.4527372955), (7.7322284054, -21.1296626544))
        make_face()
    extrude(amount=F8_DEPTH, mode=Mode.SUBTRACT)

    # F9 (radius 0.5 in the source; OpenCascade refuses exactly that, so slightly less here)
    f9_edges = [f2.edges().sort_by_distance(p)[0] for p in [
        (-30, 0, 1),
        (-1.061158, 3.960296, 1),
        (1.431507, -13.069864, 1),
        (5.29521, -12.034588, 1),
        (5.29521, -12.034588, 0),
        (-1.061158, 3.960296, 0),
        (1.431507, -13.069864, 0),
        (5.823429, -21.733331, 1),
    ]]
    fillet(f9_edges, radius=F9_R)


solid = f2.part
